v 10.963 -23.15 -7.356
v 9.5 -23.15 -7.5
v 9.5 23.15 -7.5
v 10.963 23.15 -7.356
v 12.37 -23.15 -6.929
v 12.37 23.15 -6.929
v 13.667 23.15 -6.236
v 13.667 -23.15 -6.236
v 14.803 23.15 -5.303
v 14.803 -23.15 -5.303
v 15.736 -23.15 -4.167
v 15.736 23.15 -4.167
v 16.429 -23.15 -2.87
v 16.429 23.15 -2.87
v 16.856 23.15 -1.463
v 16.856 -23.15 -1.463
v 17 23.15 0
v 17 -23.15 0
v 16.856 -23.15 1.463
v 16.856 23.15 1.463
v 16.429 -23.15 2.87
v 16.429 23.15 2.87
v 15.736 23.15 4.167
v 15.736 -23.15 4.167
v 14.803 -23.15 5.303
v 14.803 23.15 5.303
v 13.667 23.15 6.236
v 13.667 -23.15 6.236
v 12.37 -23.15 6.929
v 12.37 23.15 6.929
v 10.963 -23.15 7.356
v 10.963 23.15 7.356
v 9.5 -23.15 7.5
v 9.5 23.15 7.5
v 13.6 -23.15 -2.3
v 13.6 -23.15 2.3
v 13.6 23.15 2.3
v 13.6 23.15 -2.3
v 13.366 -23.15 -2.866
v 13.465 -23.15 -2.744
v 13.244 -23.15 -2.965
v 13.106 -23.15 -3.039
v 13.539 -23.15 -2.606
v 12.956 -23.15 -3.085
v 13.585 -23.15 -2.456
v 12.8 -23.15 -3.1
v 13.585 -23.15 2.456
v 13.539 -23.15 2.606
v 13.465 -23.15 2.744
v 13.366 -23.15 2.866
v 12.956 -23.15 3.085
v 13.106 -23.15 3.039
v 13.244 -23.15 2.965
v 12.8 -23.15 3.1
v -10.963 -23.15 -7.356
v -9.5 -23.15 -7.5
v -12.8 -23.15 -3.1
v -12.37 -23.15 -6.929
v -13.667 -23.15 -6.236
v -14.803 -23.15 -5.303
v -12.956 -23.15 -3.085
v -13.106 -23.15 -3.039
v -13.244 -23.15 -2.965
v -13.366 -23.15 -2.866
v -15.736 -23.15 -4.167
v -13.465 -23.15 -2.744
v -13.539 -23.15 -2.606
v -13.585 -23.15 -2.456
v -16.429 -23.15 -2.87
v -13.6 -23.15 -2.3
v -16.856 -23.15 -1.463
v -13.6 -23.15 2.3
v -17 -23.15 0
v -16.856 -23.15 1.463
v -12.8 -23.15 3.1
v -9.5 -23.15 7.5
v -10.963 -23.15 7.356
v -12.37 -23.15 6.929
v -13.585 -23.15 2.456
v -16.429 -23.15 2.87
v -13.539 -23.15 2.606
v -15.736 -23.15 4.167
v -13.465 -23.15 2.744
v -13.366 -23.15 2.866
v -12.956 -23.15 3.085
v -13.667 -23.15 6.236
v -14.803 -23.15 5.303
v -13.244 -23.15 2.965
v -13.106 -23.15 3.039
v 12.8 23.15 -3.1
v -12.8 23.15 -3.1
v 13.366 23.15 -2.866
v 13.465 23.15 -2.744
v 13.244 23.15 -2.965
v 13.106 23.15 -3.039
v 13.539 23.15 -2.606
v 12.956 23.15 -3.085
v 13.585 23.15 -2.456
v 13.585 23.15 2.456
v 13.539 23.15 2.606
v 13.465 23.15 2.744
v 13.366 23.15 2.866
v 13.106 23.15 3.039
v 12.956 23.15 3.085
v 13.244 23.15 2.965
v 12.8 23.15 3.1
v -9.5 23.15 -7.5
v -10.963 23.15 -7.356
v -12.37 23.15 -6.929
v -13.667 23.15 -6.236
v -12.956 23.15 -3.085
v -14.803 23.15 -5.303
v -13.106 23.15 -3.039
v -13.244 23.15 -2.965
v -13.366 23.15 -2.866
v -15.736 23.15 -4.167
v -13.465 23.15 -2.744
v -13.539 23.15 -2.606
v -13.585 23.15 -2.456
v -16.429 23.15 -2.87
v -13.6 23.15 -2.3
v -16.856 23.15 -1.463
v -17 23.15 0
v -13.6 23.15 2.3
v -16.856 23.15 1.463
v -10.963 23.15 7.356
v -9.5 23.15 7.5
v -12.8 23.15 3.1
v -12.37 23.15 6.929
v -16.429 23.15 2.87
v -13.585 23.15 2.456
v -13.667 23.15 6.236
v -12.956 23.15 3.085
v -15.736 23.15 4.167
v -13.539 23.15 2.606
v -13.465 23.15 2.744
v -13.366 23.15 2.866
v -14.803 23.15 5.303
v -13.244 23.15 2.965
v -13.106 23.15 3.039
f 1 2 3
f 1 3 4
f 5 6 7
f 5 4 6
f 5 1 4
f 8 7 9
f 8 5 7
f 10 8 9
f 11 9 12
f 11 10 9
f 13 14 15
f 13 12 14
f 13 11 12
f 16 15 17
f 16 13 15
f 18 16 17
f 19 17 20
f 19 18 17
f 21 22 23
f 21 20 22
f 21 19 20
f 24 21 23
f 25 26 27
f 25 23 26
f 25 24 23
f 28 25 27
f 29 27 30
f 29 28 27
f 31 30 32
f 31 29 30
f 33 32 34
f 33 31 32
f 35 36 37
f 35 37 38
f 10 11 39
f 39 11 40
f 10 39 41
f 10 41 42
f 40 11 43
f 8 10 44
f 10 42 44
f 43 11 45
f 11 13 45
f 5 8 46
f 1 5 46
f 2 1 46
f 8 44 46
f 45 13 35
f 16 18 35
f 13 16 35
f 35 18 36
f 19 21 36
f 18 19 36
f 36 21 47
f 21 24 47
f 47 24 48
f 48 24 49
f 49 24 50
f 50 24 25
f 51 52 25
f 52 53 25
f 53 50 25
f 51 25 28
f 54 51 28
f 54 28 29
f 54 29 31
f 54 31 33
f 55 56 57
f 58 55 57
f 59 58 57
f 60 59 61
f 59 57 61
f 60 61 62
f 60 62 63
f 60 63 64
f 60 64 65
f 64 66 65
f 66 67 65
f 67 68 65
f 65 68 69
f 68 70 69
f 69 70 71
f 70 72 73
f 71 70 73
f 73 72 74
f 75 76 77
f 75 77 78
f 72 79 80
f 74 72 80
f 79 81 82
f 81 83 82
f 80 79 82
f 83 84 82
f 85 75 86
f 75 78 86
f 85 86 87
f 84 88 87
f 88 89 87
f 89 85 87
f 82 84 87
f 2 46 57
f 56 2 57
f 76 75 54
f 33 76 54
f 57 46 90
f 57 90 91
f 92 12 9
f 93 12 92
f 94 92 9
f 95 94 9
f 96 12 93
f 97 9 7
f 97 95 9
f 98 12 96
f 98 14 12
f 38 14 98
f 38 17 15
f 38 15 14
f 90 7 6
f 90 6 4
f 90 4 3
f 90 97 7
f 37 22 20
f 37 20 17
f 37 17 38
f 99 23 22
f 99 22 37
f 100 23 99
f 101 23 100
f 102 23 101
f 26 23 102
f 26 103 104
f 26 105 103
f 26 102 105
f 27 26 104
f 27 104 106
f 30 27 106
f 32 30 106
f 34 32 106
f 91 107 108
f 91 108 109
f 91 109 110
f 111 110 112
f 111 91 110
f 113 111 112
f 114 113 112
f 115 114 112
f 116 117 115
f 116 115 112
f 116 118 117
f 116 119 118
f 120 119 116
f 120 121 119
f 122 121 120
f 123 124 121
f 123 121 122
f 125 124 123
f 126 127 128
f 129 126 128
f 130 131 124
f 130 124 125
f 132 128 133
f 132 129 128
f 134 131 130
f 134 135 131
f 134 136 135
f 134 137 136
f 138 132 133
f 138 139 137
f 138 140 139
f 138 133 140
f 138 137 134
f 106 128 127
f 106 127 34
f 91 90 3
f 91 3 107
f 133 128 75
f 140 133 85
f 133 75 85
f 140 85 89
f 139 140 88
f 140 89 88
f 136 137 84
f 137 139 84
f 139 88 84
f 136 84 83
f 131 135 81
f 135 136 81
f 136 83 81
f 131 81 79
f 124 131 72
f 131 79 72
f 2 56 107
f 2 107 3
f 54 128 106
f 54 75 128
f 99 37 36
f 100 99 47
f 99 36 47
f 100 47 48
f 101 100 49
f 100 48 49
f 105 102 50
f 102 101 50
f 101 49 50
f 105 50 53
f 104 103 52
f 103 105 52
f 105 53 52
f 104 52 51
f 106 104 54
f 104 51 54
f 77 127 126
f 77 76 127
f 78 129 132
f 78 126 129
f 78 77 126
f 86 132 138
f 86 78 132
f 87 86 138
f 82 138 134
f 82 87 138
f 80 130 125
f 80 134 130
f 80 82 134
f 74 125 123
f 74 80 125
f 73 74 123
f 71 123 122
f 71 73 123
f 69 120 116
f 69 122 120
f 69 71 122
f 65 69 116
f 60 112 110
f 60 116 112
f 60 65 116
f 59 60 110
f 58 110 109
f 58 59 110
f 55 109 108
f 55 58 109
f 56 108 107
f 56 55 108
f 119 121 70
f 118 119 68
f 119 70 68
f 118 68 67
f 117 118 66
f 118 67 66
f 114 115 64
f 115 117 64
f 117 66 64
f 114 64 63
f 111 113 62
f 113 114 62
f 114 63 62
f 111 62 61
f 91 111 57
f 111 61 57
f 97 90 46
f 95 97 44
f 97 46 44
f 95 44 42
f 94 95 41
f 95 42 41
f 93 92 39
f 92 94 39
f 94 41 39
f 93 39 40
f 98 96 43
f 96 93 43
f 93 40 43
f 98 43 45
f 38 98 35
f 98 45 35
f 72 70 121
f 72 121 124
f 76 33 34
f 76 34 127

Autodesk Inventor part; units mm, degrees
ref_plane "YZ Plane" through (0, 0, 0) normal (1, 0, 0) x (0, 1, 0)
ref_plane "XZ Plane" through (0, 0, 0) normal (0, 1, 0) x (-1, 0, 0)
ref_plane "XY Plane" through (0, 0, 0) normal (0, 0, 1) x (1, 0, 0)
sketch "Skizze1" plane through (0, 0, 0) normal (0, 1, 0) x (-1, 0, 0)
  line L0 (12.8, 3.1) -> (-12.8, 3.1)
  line L1 (-13.6, 2.3) -> (-13.6, -2.3)
  line L2 (-12.8, -3.1) -> (12.8, -3.1)
  line L3 (13.6, -2.3) -> (13.6, 2.3)
  line L4 (13.6, 3.1) -> (-13.6, -3.1) construction
  line L5 (-13.6, 3.1) -> (13.6, -3.1) construction
  arc A0 (13.6, 2.3) -> (12.8, 3.1) centre (12.8, 2.3) ccw
  arc A1 (12.8, -3.1) -> (13.6, -2.3) centre (12.8, -2.3) ccw
  arc A2 (-13.6, -2.3) -> (-12.8, -3.1) centre (-12.8, -2.3) ccw
  arc A3 (-12.8, 3.1) -> (-13.6, 2.3) centre (-12.8, 2.3) ccw
  line L6 (9.5, 0) -> (-9.5, 0) construction
  line L7 (9.5, -7.5) -> (-9.5, -7.5)
  line L8 (-9.5, 7.5) -> (9.5, 7.5)
  arc A4 (9.5, -7.5) -> (9.5, 7.5) centre (9.5, 0) ccw
  arc A5 (-9.5, 7.5) -> (-9.5, -7.5) centre (-9.5, 0) ccw
  point P0 (0, 0)
  dimension "d0" = 27.2
  dimension "d1" = 6.2
  dimension "d2" = 0.8
  dimension "d6" = 4.4
  dimension "d7" = 34
extrude "Extrusion1" add sketch "Skizze1" along normal mid plane 46.3
properties part number "Kupferspule" material "Kupfer"
